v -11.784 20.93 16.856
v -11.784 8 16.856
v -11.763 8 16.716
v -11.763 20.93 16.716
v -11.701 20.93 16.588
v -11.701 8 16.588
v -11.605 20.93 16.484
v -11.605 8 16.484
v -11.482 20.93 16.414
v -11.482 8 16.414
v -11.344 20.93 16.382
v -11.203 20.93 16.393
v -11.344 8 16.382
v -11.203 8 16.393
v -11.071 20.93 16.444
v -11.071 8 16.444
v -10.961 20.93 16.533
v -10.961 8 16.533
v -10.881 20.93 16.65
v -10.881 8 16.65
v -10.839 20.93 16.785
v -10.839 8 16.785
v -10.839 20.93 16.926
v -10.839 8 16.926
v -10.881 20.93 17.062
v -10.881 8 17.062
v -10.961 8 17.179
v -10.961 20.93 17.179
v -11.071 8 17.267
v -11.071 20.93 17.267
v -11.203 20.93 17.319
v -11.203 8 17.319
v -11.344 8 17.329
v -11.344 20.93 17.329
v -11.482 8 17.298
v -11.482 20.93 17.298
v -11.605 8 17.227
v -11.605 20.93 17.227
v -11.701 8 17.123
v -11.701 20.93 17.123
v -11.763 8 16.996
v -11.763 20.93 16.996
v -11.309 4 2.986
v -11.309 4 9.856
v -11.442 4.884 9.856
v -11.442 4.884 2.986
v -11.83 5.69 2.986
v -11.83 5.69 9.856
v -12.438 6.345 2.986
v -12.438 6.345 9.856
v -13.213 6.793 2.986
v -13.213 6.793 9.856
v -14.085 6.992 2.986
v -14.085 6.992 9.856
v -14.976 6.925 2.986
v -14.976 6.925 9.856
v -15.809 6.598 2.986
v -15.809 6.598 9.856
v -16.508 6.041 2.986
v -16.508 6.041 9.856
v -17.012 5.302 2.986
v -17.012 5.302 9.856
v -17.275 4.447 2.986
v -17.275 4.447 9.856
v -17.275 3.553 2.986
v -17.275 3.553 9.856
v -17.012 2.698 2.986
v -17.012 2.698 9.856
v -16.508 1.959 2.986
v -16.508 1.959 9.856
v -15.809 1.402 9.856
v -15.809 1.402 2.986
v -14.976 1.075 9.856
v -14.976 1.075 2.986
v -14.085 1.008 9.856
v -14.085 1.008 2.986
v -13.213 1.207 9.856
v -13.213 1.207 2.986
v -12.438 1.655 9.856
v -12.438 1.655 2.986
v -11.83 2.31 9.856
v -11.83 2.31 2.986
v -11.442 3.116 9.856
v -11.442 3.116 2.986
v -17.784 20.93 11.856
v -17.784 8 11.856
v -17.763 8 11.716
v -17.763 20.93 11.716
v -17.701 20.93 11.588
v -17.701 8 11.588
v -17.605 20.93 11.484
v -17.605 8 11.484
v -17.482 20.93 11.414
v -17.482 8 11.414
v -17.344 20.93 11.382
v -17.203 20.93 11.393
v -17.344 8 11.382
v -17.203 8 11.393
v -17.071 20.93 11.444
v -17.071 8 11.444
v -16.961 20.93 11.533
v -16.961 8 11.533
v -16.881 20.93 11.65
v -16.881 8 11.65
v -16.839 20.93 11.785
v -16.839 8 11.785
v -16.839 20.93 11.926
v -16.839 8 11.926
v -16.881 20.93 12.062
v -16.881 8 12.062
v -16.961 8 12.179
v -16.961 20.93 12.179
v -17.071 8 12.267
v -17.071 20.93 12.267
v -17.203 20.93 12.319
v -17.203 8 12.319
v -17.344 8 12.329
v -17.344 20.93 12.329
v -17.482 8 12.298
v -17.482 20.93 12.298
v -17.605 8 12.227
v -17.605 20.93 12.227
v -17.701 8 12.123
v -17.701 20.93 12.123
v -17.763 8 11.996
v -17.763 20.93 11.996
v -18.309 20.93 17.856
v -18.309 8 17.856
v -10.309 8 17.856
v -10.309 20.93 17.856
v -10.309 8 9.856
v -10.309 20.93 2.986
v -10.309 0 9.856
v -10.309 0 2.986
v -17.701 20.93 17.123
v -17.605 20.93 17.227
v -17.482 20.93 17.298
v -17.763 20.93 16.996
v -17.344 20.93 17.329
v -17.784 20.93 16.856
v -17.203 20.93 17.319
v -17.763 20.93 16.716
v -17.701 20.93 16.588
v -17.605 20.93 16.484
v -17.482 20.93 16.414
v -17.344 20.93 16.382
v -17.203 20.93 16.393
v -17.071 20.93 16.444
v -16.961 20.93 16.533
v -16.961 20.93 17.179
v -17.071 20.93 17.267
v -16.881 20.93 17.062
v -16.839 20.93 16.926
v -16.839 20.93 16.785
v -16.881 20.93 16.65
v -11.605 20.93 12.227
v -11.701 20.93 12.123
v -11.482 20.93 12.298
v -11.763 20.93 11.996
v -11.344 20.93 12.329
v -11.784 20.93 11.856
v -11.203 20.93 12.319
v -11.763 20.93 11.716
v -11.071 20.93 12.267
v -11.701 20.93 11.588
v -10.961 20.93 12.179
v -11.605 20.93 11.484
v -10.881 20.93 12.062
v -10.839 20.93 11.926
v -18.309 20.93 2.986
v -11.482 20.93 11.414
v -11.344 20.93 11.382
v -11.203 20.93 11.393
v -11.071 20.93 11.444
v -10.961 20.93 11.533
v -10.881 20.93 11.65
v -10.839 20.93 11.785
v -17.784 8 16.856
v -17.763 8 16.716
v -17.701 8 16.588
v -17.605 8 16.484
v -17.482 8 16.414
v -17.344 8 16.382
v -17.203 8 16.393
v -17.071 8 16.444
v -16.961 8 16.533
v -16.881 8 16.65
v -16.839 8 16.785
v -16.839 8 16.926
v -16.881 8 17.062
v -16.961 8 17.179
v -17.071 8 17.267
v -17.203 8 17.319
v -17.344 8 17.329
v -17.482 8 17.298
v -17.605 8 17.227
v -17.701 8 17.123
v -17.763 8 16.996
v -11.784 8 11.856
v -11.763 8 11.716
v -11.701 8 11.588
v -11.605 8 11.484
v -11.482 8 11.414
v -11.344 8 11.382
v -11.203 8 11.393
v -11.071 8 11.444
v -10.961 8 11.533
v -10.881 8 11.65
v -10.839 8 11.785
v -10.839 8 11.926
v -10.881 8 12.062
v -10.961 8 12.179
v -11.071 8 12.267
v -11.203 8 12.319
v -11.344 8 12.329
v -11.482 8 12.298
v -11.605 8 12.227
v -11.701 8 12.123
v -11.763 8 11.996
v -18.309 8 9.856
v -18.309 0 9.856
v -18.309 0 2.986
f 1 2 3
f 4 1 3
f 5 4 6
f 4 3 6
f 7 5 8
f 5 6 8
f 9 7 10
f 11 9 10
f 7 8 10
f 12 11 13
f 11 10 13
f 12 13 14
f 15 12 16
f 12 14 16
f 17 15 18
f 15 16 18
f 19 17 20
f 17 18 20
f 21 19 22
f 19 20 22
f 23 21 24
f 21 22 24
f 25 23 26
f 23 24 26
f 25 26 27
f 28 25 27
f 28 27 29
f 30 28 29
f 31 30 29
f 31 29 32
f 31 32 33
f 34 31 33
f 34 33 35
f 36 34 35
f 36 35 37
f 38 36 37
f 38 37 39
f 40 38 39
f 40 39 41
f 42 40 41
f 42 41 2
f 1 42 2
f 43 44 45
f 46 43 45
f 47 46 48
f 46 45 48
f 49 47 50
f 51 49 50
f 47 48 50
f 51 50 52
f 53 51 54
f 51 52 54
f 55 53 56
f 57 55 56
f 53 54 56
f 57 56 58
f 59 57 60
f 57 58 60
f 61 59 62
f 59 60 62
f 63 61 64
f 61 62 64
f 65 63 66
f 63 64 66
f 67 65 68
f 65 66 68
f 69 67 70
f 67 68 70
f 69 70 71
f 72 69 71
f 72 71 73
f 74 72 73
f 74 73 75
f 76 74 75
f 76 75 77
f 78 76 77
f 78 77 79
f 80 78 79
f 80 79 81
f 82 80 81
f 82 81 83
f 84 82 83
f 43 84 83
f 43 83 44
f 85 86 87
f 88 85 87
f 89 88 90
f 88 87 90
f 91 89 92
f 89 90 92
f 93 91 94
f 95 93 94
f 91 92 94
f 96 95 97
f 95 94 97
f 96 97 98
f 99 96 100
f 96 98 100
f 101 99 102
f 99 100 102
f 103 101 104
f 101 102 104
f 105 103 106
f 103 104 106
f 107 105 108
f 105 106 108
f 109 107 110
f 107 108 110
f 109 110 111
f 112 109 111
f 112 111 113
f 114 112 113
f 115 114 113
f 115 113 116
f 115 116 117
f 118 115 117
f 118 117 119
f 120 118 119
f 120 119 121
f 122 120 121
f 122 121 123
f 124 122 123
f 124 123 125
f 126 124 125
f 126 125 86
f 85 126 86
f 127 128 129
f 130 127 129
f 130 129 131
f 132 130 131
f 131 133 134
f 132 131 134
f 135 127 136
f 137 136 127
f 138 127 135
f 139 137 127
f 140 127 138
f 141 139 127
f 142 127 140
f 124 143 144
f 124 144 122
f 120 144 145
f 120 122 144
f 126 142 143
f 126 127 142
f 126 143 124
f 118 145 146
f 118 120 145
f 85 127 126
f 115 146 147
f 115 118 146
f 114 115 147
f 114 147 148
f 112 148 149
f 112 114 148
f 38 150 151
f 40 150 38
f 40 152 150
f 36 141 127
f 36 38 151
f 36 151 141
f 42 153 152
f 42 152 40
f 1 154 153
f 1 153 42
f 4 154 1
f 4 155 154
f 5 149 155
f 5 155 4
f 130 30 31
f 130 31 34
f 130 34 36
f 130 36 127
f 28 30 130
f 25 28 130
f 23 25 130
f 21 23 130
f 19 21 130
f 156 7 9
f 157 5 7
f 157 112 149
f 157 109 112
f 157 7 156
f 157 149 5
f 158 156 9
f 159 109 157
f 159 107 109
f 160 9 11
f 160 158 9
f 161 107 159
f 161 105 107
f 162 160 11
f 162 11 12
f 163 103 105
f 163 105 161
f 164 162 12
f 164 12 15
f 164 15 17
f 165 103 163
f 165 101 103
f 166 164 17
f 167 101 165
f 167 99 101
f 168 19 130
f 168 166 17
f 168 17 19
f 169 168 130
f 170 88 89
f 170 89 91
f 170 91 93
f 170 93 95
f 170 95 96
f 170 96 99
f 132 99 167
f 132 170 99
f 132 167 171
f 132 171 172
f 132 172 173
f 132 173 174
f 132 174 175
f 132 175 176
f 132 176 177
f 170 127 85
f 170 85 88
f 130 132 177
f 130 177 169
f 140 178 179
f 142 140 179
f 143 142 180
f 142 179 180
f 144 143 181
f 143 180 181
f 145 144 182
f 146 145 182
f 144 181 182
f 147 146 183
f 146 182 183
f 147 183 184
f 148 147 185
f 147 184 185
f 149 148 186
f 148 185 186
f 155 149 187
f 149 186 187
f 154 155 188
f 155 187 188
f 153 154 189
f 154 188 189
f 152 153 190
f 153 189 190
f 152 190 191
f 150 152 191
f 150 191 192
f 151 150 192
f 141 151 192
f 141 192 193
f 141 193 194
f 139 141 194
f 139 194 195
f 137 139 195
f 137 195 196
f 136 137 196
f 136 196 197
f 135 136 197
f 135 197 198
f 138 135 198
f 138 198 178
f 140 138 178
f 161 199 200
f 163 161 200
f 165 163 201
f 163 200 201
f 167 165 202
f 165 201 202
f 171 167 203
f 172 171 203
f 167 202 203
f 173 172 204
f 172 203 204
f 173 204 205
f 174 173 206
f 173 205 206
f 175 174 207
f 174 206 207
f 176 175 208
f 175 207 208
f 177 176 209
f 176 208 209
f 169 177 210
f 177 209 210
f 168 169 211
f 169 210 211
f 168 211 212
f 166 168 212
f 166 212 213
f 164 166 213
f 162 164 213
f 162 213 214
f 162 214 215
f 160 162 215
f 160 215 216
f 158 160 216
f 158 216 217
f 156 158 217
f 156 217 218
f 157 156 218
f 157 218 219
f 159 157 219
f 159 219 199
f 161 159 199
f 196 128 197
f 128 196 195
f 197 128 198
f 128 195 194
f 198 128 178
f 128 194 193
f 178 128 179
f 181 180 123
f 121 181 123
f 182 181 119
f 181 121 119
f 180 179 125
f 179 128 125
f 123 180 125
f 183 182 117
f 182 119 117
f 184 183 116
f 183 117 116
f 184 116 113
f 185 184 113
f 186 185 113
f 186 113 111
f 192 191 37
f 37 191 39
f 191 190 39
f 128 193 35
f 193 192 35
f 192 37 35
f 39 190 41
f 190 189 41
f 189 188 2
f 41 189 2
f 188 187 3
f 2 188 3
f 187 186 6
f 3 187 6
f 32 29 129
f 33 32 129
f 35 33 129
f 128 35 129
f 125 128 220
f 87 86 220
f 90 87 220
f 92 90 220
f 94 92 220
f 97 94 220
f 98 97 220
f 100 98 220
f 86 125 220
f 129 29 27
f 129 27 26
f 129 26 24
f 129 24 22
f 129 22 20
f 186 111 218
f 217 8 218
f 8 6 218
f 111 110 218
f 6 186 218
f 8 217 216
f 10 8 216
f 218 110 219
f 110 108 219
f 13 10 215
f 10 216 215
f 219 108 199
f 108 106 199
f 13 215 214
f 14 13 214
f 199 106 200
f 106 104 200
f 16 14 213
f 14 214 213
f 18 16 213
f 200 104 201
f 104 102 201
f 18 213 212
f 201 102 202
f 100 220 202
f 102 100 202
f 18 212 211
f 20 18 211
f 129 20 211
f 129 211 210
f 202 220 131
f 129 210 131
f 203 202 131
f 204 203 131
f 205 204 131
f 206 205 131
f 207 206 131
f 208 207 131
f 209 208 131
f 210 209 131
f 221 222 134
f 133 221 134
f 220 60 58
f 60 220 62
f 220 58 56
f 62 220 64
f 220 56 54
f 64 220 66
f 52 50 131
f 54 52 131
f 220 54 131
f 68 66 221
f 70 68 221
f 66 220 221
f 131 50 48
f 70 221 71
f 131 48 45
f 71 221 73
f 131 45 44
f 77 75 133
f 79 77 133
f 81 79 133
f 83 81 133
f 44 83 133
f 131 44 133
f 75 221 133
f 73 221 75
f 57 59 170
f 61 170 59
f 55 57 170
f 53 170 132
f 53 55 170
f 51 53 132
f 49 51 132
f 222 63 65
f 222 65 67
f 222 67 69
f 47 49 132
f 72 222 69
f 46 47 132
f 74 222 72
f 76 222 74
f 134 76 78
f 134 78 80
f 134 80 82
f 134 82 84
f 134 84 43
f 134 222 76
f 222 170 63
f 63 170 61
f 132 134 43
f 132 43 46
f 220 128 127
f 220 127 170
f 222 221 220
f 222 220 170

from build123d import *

# Parameters (mm, degrees)
SKETCH1_W                = 8
SKETCH1_H                = 6.87
BOSS_EXTRUDE3_DEPTH      = 8
SKETCH2_W                = 8
SKETCH2_H                = 14.87
BOSS_EXTRUDE5_DEPTH      = 12.93
M1_2X0_25_TAPPED_HOLE1_D = 0.95
F_1_0MM_DOWEL_HOLE1_D    = 6


with BuildPart() as part:
    # Sketch1 → Boss-Extrude3 (new body)
    with BuildSketch(Plane(origin=(0, 0, 0), x_dir=(1, 0, 0), z_dir=(0, 1, 0))):
        with Locations((-14.308724832, -6.420704698)):
            Rectangle(SKETCH1_W, SKETCH1_H)
    extrude(amount=BOSS_EXTRUDE3_DEPTH)

    # Sketch2 → Boss-Extrude5 (add)
    with BuildSketch(Plane(origin=(0, 8, 0), x_dir=(1, 0, 0), z_dir=(0, 1, 0))):
        with Locations((-14.308724832, -10.420704698)):
            Rectangle(SKETCH2_W, SKETCH2_H)
    extrude(amount=BOSS_EXTRUDE5_DEPTH)

    # M1.2x0.25 Tapped Hole1 (through all)
    with Locations(Plane(origin=(0, 20.93, 0), x_dir=(1, 0, 0), z_dir=(0, 1, 0))):
        with Locations((-17.308724832, -11.855704698), (-11.308724832, -11.855704698), (-17.308724832, -16.855704698), (-11.308724832, -16.855704698)):
            Hole(M1_2X0_25_TAPPED_HOLE1_D / 2)

    # Ø1.0mm Dowel Hole1 (through all)
    with Locations(Plane(origin=(0, 0, 2.985704698), x_dir=(-1, 0, 0), z_dir=(0, 0, -1))):
        with Locations((14.308724832, 4)):
            Hole(F_1_0MM_DOWEL_HOLE1_D / 2)


solid = part.part
